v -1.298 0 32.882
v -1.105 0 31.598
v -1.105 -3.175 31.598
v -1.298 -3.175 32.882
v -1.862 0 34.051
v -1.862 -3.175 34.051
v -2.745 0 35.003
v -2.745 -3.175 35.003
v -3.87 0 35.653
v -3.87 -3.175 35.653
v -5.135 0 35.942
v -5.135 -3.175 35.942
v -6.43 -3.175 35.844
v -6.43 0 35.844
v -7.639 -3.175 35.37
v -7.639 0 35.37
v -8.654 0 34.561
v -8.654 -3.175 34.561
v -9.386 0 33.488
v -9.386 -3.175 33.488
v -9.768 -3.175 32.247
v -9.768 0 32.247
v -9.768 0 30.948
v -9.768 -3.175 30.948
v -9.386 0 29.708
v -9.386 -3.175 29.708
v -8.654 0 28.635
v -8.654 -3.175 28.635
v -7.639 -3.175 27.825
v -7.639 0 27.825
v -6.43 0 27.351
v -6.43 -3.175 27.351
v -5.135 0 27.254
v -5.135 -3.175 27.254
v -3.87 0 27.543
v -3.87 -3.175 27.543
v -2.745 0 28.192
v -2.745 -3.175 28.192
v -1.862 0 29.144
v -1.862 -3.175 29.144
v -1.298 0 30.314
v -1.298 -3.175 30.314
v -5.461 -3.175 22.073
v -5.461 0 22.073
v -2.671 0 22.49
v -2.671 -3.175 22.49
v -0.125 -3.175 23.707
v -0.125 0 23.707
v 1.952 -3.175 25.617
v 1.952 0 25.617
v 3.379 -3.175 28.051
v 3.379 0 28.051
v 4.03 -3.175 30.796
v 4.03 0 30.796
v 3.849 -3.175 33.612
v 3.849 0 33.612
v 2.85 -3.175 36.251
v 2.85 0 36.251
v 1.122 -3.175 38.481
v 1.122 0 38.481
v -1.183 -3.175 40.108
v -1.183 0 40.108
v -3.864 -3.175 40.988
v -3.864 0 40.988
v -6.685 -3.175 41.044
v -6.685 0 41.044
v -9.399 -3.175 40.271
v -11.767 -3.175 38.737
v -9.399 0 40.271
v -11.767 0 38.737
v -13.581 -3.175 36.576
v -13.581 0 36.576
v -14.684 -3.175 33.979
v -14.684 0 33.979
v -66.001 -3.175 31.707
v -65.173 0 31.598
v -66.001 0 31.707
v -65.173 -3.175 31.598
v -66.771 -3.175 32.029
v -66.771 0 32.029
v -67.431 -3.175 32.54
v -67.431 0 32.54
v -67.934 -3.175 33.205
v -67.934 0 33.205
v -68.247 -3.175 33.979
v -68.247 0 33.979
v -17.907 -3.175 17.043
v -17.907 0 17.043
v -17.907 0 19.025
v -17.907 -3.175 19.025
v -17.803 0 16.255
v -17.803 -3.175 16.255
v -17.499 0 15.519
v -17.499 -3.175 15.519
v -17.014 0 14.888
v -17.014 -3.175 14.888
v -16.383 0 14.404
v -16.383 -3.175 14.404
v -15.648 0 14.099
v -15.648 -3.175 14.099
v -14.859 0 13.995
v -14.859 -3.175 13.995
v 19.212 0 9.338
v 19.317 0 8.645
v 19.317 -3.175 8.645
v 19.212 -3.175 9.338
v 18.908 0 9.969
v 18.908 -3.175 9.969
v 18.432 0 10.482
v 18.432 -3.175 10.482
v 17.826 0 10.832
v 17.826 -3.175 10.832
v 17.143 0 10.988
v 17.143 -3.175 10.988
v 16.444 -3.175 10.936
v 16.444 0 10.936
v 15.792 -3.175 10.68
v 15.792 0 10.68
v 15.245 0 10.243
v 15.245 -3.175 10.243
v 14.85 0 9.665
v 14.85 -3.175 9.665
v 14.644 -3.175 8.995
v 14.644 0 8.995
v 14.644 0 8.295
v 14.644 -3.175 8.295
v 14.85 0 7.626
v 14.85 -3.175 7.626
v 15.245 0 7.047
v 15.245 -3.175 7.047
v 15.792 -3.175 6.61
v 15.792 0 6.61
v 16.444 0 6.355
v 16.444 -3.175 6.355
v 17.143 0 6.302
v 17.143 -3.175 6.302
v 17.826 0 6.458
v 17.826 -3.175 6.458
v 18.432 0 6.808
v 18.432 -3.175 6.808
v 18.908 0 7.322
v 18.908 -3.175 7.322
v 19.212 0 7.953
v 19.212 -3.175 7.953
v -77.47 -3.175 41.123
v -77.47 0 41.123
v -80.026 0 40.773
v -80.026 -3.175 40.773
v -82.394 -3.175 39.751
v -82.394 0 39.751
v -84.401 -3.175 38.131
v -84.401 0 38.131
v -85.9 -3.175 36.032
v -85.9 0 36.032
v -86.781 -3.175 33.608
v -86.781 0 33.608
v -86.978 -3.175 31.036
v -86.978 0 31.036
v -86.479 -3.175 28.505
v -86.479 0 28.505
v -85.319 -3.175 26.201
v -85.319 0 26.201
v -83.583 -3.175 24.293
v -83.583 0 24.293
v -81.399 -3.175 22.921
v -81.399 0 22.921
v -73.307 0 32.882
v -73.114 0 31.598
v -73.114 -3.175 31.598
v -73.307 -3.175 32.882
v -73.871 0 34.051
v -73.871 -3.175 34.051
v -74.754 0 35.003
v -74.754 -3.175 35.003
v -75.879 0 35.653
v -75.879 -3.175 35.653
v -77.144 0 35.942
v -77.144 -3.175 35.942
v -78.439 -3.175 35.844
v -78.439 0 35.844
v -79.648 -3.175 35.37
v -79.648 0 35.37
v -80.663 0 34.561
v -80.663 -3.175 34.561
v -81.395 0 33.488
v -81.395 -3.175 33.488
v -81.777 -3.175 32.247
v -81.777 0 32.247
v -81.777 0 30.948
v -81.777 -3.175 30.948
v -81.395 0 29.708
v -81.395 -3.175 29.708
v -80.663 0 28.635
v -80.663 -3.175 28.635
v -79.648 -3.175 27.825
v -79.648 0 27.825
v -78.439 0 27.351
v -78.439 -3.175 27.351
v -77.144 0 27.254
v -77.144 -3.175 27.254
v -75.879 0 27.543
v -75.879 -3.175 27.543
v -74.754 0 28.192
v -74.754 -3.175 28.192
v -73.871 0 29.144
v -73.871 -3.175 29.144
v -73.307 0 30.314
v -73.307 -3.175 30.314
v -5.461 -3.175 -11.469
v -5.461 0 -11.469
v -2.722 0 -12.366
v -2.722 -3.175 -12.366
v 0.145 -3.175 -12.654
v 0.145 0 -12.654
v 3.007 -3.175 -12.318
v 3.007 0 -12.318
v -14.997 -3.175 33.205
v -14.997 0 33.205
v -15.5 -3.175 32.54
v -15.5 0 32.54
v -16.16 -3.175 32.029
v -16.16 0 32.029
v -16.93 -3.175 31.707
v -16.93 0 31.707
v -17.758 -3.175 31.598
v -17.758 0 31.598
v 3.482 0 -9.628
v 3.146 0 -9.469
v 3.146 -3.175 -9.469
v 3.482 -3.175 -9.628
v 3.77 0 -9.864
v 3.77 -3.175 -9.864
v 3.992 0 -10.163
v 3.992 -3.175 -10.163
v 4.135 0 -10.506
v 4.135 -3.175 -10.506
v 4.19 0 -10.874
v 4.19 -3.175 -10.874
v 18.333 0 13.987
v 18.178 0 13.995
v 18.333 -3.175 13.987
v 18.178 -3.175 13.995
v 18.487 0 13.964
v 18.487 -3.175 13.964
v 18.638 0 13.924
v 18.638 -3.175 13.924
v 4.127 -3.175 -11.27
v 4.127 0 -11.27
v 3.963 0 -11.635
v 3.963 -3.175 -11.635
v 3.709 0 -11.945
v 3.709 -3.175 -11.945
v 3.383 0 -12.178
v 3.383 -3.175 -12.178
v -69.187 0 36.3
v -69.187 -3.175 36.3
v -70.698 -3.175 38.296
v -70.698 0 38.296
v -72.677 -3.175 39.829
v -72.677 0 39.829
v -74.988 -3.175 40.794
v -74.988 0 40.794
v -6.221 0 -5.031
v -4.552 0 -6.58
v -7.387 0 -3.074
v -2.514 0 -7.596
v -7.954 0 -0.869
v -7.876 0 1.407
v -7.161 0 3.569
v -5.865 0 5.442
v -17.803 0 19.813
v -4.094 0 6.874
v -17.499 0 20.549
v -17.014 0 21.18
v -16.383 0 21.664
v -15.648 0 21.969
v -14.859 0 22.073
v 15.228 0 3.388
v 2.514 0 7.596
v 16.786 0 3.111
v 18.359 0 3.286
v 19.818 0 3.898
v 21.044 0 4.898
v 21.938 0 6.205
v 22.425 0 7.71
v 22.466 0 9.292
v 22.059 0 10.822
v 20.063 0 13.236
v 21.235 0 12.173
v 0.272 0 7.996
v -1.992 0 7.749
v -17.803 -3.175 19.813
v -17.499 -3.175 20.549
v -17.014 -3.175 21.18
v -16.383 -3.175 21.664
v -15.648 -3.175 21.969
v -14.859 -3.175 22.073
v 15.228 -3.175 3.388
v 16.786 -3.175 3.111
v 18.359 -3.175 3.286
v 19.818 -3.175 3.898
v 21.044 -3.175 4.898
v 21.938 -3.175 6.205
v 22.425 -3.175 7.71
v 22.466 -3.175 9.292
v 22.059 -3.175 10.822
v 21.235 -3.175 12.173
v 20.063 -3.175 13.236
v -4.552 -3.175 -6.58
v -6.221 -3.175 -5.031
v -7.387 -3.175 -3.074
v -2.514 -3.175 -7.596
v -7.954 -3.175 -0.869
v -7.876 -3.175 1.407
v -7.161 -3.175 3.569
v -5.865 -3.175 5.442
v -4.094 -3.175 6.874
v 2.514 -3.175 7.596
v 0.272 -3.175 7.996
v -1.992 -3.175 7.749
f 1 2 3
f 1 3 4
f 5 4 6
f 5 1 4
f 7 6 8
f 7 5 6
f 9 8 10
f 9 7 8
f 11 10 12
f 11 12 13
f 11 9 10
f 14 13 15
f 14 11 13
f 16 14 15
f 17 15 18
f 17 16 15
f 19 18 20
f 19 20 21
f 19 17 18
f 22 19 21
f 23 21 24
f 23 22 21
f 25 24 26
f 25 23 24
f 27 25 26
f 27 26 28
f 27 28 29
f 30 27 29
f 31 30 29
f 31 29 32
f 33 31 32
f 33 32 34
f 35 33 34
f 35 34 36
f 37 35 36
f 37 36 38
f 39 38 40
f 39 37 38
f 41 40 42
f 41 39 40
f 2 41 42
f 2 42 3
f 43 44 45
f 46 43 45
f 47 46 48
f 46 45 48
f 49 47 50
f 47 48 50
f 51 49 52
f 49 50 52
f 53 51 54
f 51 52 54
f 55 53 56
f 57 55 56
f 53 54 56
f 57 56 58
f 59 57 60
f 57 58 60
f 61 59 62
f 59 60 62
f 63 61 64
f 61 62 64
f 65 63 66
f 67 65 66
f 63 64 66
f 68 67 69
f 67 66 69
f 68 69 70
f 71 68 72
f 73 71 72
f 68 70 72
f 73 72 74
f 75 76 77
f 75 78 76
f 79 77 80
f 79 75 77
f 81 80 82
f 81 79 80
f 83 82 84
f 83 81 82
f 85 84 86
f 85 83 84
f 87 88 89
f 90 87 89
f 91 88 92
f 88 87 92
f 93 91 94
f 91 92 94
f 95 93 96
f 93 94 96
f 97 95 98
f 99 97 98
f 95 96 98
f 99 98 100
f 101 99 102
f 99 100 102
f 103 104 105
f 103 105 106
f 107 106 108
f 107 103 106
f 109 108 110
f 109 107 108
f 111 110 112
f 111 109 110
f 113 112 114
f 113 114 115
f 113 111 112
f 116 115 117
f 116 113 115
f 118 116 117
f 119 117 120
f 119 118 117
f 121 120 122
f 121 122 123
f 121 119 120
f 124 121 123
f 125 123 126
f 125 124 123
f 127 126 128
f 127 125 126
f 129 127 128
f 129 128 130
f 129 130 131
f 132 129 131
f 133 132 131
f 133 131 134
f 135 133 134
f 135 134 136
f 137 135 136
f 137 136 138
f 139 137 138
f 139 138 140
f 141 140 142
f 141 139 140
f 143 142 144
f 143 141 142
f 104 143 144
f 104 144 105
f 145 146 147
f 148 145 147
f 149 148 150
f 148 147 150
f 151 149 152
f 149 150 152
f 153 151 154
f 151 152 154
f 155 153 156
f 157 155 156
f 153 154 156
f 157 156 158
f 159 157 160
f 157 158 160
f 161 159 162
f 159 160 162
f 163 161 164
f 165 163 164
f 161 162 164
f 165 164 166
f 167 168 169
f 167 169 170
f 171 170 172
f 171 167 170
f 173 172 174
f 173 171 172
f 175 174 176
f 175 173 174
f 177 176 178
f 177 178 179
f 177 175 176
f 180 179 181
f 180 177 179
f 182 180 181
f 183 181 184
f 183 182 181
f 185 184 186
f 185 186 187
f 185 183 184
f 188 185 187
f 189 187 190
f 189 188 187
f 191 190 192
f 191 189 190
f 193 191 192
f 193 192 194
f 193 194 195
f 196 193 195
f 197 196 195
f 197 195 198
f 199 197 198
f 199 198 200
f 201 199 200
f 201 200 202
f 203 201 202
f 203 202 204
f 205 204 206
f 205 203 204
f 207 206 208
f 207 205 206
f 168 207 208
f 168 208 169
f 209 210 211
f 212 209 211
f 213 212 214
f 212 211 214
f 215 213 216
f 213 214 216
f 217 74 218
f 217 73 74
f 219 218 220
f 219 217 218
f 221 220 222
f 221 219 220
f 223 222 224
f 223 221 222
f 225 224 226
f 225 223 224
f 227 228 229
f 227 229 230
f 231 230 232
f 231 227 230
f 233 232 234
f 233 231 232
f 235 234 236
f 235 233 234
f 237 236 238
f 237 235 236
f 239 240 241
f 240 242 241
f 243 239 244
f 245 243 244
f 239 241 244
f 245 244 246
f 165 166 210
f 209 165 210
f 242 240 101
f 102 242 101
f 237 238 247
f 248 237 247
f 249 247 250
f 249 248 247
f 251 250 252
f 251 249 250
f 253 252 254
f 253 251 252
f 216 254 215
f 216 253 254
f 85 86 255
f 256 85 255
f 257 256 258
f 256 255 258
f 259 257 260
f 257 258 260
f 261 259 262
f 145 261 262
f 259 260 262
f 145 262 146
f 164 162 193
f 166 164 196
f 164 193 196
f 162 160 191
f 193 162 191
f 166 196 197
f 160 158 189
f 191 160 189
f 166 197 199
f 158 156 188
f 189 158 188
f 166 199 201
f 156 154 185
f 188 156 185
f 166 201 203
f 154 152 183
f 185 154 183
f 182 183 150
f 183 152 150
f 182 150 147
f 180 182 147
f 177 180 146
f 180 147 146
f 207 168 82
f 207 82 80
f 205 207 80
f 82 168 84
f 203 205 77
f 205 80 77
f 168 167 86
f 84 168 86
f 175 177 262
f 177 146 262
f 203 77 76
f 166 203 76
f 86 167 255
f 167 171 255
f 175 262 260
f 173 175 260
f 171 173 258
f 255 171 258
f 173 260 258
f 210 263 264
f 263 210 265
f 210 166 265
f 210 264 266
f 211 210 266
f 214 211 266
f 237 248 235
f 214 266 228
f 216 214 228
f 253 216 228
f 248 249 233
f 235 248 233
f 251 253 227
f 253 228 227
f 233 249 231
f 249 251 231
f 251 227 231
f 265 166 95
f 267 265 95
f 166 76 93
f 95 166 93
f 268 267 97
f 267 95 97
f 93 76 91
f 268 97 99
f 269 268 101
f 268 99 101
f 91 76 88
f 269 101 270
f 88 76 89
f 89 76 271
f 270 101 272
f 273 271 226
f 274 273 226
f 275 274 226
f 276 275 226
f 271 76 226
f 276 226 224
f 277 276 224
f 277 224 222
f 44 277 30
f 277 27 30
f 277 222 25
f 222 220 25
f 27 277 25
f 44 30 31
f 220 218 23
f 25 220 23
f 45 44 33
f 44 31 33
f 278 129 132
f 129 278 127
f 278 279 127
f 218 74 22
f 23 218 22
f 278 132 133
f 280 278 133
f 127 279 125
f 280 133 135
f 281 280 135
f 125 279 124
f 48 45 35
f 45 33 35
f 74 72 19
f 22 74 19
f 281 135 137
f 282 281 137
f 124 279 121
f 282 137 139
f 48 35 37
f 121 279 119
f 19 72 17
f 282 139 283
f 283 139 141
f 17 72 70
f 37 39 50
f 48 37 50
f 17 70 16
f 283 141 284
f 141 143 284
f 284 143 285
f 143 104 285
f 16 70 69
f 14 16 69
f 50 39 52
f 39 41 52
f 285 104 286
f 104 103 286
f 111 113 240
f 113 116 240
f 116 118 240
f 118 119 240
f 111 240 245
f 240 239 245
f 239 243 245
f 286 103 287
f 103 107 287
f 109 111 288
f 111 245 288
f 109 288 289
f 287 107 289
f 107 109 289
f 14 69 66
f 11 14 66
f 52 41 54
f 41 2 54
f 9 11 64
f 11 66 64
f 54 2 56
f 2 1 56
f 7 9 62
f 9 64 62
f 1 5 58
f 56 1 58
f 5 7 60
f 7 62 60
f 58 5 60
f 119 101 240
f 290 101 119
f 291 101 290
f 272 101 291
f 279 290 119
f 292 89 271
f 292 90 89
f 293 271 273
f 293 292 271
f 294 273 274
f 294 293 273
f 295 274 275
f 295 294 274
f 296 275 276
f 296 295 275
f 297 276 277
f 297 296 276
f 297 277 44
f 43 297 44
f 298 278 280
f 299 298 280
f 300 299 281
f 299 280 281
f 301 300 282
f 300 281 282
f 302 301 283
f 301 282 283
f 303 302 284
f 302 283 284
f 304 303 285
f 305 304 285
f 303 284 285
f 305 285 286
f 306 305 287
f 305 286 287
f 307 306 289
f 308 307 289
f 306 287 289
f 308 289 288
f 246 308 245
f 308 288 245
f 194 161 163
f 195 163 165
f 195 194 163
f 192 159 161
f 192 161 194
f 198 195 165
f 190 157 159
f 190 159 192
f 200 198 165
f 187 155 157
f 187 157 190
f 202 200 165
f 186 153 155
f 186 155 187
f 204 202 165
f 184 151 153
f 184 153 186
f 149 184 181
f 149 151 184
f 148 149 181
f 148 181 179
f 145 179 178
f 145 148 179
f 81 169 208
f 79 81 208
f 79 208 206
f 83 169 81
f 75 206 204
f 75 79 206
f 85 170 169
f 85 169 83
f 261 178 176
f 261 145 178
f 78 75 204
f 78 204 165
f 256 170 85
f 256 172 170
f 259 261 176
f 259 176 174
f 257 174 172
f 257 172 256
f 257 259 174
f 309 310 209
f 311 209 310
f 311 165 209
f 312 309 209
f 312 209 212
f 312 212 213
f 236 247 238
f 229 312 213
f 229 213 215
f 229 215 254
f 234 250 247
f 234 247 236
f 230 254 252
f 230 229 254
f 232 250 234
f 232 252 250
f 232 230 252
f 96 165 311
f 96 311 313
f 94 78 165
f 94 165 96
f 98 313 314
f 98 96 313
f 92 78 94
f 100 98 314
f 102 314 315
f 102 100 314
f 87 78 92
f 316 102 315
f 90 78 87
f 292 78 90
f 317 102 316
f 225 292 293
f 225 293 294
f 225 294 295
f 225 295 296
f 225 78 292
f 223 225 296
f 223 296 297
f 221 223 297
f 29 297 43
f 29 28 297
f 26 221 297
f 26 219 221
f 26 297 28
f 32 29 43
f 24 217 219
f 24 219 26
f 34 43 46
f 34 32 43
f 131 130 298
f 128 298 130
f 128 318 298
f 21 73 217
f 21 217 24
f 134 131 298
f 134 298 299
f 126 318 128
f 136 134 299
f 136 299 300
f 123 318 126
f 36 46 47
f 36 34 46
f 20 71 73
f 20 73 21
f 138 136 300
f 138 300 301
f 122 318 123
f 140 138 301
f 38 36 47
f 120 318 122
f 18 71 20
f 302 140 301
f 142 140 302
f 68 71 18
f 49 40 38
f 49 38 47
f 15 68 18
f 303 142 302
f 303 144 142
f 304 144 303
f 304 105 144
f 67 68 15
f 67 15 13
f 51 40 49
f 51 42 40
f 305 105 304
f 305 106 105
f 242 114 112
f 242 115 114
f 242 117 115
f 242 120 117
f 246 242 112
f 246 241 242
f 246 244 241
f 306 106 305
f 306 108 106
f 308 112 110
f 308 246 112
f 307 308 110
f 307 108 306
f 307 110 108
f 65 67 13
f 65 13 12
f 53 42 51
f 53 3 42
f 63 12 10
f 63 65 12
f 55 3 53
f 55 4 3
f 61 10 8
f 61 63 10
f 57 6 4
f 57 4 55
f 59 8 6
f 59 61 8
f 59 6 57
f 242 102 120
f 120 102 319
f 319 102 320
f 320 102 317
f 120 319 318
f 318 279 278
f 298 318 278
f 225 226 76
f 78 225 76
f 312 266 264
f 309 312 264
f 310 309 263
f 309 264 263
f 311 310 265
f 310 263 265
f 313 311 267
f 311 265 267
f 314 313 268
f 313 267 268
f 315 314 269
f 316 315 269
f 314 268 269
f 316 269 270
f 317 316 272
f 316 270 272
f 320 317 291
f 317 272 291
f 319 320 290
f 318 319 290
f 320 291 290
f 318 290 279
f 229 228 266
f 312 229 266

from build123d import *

# Parameters (mm, degrees)
F0_R        = 2.3495
F0_R_2      = 4.3561
F1_DEPTH    = 3.175
F2_T1_DEPTH = 8.6796915338
F2_T3_DEPTH = 9.317688033
F3_R        = 3.048
F4_R        = 3.175
F5_R        = 1.524


# Not quite as in the source:
# - a fillet or chamfer that OpenCascade refuses, or shapes differently, is made with other operations: its cross-section is extruded or revolved along the edge and cut away or added


with BuildPart() as f1:
    # F0 (on Front) → F1 (new body)
    with BuildSketch(Plane.XZ):
        with BuildLine():
            Line((-17.907, 13.9954), (-17.907, 22.0726))
            Line((-17.907, 22.0726), (-5.461, 22.0726))
            ThreePointArc((-5.461, 22.0726), (4.064, 31.5976), (-5.461, 41.1226))
            ThreePointArc((-5.461, 41.1226), (-12.1961920908, 38.3327920908), (-14.986, 31.5976))
            Line((-14.986, 31.5976), (-67.945, 31.5976))
            ThreePointArc((-67.945, 31.5976), (-70.7348079092, 38.3327920908), (-77.47, 41.1226))
            ThreePointArc((-77.47, 41.1226), (-86.7805213206, 33.6075297847), (-81.3993425959, 22.9208556933))
            Line((-81.3993425959, 22.9208556933), (-5.461, -11.4685135998))
            ThreePointArc((-5.461, -11.4685135998), (-0.6838491315, -12.6351736228), (4.191, -11.9885578365))
            Line((4.191, -11.9885578365), (4.191, -9.8147056722))
            Line((4.191, -9.8147056722), (-2.5137480378, -7.5958588588))
            ThreePointArc((-2.5137480378, -7.5958588588), (-7.5958588588, 2.5137480378), (2.5137480378, 7.5958588588))
            Line((2.5137480378, 7.5958588588), (15.2275267548, 3.3884035996))
            ThreePointArc((15.2275267548, 3.3884035996), (22.2730028192, 7.0612251677), (18.3941407903, 13.9954))
            Line((18.3941407903, 13.9954), (-17.907, 13.9954))
        make_face()
        with Locations((16.9672, 8.6452202067)):
            Circle(F0_R, mode=Mode.SUBTRACT)
        with Locations((-77.47, 31.5976)):
            Circle(F0_R_2, mode=Mode.SUBTRACT)
        with Locations((-5.461, 31.5976)):
            Circle(F0_R_2, mode=Mode.SUBTRACT)
    extrude(amount=F1_DEPTH)

    # F2: fillet of radius 1.524 on 2 edges, made by hand

    # F2_s2 → F2_t1 (cut)
    with BuildSketch(Plane.XZ.offset(-2.7523457669)):
        with BuildLine():
            ThreePointArc((3.1458091501, -9.4688137202), (3.9023706215, -10.0232116691), (4.191, -10.915643979))
            Line((4.191, -10.915643979), (4.191, -9.8147056722))
            Line((4.191, -9.8147056722), (3.1458091501, -9.4688137202))
        make_face()
    extrude(amount=F2_T1_DEPTH, mode=Mode.SUBTRACT)

    # F2_s4 → F2_t3 (cut)
    with BuildSketch(Plane.XZ.offset(-3.0713440165)):
        with BuildLine():
            ThreePointArc((4.191, -10.8324529742), (3.8589330034, -11.7821222406), (3.0074413182, -12.3179413481))
            ThreePointArc((3.0074413182, -12.3179413481), (3.6030210464, -12.1669053498), (4.191, -11.9885578365))
            Line((4.191, -11.9885578365), (4.191, -10.8324529742))
        make_face()
    extrude(amount=F2_T3_DEPTH, mode=Mode.SUBTRACT)

    # F3
    f3_edges = [f1.edges().sort_by_distance(p)[0] for p in [
        (-17.907, -1.5875, 22.0726),
        (-17.907, -1.5875, 13.9954),
    ]]
    fillet(f3_edges, radius=F3_R)

    # F4
    f4_edges = [f1.edges().sort_by_distance(p)[0] for p in [
        (-67.945, -1.5875, 31.5976),
        (-14.986, -1.5875, 31.5976),
    ]]
    fillet(f4_edges, radius=F4_R)

    # F5
    f5_edges = [f1.edges().sort_by_distance(p)[0] for p in [
        (18.394141, -1.5875, 13.9954),
    ]]
    fillet(f5_edges, radius=F5_R)


solid = f1.part
